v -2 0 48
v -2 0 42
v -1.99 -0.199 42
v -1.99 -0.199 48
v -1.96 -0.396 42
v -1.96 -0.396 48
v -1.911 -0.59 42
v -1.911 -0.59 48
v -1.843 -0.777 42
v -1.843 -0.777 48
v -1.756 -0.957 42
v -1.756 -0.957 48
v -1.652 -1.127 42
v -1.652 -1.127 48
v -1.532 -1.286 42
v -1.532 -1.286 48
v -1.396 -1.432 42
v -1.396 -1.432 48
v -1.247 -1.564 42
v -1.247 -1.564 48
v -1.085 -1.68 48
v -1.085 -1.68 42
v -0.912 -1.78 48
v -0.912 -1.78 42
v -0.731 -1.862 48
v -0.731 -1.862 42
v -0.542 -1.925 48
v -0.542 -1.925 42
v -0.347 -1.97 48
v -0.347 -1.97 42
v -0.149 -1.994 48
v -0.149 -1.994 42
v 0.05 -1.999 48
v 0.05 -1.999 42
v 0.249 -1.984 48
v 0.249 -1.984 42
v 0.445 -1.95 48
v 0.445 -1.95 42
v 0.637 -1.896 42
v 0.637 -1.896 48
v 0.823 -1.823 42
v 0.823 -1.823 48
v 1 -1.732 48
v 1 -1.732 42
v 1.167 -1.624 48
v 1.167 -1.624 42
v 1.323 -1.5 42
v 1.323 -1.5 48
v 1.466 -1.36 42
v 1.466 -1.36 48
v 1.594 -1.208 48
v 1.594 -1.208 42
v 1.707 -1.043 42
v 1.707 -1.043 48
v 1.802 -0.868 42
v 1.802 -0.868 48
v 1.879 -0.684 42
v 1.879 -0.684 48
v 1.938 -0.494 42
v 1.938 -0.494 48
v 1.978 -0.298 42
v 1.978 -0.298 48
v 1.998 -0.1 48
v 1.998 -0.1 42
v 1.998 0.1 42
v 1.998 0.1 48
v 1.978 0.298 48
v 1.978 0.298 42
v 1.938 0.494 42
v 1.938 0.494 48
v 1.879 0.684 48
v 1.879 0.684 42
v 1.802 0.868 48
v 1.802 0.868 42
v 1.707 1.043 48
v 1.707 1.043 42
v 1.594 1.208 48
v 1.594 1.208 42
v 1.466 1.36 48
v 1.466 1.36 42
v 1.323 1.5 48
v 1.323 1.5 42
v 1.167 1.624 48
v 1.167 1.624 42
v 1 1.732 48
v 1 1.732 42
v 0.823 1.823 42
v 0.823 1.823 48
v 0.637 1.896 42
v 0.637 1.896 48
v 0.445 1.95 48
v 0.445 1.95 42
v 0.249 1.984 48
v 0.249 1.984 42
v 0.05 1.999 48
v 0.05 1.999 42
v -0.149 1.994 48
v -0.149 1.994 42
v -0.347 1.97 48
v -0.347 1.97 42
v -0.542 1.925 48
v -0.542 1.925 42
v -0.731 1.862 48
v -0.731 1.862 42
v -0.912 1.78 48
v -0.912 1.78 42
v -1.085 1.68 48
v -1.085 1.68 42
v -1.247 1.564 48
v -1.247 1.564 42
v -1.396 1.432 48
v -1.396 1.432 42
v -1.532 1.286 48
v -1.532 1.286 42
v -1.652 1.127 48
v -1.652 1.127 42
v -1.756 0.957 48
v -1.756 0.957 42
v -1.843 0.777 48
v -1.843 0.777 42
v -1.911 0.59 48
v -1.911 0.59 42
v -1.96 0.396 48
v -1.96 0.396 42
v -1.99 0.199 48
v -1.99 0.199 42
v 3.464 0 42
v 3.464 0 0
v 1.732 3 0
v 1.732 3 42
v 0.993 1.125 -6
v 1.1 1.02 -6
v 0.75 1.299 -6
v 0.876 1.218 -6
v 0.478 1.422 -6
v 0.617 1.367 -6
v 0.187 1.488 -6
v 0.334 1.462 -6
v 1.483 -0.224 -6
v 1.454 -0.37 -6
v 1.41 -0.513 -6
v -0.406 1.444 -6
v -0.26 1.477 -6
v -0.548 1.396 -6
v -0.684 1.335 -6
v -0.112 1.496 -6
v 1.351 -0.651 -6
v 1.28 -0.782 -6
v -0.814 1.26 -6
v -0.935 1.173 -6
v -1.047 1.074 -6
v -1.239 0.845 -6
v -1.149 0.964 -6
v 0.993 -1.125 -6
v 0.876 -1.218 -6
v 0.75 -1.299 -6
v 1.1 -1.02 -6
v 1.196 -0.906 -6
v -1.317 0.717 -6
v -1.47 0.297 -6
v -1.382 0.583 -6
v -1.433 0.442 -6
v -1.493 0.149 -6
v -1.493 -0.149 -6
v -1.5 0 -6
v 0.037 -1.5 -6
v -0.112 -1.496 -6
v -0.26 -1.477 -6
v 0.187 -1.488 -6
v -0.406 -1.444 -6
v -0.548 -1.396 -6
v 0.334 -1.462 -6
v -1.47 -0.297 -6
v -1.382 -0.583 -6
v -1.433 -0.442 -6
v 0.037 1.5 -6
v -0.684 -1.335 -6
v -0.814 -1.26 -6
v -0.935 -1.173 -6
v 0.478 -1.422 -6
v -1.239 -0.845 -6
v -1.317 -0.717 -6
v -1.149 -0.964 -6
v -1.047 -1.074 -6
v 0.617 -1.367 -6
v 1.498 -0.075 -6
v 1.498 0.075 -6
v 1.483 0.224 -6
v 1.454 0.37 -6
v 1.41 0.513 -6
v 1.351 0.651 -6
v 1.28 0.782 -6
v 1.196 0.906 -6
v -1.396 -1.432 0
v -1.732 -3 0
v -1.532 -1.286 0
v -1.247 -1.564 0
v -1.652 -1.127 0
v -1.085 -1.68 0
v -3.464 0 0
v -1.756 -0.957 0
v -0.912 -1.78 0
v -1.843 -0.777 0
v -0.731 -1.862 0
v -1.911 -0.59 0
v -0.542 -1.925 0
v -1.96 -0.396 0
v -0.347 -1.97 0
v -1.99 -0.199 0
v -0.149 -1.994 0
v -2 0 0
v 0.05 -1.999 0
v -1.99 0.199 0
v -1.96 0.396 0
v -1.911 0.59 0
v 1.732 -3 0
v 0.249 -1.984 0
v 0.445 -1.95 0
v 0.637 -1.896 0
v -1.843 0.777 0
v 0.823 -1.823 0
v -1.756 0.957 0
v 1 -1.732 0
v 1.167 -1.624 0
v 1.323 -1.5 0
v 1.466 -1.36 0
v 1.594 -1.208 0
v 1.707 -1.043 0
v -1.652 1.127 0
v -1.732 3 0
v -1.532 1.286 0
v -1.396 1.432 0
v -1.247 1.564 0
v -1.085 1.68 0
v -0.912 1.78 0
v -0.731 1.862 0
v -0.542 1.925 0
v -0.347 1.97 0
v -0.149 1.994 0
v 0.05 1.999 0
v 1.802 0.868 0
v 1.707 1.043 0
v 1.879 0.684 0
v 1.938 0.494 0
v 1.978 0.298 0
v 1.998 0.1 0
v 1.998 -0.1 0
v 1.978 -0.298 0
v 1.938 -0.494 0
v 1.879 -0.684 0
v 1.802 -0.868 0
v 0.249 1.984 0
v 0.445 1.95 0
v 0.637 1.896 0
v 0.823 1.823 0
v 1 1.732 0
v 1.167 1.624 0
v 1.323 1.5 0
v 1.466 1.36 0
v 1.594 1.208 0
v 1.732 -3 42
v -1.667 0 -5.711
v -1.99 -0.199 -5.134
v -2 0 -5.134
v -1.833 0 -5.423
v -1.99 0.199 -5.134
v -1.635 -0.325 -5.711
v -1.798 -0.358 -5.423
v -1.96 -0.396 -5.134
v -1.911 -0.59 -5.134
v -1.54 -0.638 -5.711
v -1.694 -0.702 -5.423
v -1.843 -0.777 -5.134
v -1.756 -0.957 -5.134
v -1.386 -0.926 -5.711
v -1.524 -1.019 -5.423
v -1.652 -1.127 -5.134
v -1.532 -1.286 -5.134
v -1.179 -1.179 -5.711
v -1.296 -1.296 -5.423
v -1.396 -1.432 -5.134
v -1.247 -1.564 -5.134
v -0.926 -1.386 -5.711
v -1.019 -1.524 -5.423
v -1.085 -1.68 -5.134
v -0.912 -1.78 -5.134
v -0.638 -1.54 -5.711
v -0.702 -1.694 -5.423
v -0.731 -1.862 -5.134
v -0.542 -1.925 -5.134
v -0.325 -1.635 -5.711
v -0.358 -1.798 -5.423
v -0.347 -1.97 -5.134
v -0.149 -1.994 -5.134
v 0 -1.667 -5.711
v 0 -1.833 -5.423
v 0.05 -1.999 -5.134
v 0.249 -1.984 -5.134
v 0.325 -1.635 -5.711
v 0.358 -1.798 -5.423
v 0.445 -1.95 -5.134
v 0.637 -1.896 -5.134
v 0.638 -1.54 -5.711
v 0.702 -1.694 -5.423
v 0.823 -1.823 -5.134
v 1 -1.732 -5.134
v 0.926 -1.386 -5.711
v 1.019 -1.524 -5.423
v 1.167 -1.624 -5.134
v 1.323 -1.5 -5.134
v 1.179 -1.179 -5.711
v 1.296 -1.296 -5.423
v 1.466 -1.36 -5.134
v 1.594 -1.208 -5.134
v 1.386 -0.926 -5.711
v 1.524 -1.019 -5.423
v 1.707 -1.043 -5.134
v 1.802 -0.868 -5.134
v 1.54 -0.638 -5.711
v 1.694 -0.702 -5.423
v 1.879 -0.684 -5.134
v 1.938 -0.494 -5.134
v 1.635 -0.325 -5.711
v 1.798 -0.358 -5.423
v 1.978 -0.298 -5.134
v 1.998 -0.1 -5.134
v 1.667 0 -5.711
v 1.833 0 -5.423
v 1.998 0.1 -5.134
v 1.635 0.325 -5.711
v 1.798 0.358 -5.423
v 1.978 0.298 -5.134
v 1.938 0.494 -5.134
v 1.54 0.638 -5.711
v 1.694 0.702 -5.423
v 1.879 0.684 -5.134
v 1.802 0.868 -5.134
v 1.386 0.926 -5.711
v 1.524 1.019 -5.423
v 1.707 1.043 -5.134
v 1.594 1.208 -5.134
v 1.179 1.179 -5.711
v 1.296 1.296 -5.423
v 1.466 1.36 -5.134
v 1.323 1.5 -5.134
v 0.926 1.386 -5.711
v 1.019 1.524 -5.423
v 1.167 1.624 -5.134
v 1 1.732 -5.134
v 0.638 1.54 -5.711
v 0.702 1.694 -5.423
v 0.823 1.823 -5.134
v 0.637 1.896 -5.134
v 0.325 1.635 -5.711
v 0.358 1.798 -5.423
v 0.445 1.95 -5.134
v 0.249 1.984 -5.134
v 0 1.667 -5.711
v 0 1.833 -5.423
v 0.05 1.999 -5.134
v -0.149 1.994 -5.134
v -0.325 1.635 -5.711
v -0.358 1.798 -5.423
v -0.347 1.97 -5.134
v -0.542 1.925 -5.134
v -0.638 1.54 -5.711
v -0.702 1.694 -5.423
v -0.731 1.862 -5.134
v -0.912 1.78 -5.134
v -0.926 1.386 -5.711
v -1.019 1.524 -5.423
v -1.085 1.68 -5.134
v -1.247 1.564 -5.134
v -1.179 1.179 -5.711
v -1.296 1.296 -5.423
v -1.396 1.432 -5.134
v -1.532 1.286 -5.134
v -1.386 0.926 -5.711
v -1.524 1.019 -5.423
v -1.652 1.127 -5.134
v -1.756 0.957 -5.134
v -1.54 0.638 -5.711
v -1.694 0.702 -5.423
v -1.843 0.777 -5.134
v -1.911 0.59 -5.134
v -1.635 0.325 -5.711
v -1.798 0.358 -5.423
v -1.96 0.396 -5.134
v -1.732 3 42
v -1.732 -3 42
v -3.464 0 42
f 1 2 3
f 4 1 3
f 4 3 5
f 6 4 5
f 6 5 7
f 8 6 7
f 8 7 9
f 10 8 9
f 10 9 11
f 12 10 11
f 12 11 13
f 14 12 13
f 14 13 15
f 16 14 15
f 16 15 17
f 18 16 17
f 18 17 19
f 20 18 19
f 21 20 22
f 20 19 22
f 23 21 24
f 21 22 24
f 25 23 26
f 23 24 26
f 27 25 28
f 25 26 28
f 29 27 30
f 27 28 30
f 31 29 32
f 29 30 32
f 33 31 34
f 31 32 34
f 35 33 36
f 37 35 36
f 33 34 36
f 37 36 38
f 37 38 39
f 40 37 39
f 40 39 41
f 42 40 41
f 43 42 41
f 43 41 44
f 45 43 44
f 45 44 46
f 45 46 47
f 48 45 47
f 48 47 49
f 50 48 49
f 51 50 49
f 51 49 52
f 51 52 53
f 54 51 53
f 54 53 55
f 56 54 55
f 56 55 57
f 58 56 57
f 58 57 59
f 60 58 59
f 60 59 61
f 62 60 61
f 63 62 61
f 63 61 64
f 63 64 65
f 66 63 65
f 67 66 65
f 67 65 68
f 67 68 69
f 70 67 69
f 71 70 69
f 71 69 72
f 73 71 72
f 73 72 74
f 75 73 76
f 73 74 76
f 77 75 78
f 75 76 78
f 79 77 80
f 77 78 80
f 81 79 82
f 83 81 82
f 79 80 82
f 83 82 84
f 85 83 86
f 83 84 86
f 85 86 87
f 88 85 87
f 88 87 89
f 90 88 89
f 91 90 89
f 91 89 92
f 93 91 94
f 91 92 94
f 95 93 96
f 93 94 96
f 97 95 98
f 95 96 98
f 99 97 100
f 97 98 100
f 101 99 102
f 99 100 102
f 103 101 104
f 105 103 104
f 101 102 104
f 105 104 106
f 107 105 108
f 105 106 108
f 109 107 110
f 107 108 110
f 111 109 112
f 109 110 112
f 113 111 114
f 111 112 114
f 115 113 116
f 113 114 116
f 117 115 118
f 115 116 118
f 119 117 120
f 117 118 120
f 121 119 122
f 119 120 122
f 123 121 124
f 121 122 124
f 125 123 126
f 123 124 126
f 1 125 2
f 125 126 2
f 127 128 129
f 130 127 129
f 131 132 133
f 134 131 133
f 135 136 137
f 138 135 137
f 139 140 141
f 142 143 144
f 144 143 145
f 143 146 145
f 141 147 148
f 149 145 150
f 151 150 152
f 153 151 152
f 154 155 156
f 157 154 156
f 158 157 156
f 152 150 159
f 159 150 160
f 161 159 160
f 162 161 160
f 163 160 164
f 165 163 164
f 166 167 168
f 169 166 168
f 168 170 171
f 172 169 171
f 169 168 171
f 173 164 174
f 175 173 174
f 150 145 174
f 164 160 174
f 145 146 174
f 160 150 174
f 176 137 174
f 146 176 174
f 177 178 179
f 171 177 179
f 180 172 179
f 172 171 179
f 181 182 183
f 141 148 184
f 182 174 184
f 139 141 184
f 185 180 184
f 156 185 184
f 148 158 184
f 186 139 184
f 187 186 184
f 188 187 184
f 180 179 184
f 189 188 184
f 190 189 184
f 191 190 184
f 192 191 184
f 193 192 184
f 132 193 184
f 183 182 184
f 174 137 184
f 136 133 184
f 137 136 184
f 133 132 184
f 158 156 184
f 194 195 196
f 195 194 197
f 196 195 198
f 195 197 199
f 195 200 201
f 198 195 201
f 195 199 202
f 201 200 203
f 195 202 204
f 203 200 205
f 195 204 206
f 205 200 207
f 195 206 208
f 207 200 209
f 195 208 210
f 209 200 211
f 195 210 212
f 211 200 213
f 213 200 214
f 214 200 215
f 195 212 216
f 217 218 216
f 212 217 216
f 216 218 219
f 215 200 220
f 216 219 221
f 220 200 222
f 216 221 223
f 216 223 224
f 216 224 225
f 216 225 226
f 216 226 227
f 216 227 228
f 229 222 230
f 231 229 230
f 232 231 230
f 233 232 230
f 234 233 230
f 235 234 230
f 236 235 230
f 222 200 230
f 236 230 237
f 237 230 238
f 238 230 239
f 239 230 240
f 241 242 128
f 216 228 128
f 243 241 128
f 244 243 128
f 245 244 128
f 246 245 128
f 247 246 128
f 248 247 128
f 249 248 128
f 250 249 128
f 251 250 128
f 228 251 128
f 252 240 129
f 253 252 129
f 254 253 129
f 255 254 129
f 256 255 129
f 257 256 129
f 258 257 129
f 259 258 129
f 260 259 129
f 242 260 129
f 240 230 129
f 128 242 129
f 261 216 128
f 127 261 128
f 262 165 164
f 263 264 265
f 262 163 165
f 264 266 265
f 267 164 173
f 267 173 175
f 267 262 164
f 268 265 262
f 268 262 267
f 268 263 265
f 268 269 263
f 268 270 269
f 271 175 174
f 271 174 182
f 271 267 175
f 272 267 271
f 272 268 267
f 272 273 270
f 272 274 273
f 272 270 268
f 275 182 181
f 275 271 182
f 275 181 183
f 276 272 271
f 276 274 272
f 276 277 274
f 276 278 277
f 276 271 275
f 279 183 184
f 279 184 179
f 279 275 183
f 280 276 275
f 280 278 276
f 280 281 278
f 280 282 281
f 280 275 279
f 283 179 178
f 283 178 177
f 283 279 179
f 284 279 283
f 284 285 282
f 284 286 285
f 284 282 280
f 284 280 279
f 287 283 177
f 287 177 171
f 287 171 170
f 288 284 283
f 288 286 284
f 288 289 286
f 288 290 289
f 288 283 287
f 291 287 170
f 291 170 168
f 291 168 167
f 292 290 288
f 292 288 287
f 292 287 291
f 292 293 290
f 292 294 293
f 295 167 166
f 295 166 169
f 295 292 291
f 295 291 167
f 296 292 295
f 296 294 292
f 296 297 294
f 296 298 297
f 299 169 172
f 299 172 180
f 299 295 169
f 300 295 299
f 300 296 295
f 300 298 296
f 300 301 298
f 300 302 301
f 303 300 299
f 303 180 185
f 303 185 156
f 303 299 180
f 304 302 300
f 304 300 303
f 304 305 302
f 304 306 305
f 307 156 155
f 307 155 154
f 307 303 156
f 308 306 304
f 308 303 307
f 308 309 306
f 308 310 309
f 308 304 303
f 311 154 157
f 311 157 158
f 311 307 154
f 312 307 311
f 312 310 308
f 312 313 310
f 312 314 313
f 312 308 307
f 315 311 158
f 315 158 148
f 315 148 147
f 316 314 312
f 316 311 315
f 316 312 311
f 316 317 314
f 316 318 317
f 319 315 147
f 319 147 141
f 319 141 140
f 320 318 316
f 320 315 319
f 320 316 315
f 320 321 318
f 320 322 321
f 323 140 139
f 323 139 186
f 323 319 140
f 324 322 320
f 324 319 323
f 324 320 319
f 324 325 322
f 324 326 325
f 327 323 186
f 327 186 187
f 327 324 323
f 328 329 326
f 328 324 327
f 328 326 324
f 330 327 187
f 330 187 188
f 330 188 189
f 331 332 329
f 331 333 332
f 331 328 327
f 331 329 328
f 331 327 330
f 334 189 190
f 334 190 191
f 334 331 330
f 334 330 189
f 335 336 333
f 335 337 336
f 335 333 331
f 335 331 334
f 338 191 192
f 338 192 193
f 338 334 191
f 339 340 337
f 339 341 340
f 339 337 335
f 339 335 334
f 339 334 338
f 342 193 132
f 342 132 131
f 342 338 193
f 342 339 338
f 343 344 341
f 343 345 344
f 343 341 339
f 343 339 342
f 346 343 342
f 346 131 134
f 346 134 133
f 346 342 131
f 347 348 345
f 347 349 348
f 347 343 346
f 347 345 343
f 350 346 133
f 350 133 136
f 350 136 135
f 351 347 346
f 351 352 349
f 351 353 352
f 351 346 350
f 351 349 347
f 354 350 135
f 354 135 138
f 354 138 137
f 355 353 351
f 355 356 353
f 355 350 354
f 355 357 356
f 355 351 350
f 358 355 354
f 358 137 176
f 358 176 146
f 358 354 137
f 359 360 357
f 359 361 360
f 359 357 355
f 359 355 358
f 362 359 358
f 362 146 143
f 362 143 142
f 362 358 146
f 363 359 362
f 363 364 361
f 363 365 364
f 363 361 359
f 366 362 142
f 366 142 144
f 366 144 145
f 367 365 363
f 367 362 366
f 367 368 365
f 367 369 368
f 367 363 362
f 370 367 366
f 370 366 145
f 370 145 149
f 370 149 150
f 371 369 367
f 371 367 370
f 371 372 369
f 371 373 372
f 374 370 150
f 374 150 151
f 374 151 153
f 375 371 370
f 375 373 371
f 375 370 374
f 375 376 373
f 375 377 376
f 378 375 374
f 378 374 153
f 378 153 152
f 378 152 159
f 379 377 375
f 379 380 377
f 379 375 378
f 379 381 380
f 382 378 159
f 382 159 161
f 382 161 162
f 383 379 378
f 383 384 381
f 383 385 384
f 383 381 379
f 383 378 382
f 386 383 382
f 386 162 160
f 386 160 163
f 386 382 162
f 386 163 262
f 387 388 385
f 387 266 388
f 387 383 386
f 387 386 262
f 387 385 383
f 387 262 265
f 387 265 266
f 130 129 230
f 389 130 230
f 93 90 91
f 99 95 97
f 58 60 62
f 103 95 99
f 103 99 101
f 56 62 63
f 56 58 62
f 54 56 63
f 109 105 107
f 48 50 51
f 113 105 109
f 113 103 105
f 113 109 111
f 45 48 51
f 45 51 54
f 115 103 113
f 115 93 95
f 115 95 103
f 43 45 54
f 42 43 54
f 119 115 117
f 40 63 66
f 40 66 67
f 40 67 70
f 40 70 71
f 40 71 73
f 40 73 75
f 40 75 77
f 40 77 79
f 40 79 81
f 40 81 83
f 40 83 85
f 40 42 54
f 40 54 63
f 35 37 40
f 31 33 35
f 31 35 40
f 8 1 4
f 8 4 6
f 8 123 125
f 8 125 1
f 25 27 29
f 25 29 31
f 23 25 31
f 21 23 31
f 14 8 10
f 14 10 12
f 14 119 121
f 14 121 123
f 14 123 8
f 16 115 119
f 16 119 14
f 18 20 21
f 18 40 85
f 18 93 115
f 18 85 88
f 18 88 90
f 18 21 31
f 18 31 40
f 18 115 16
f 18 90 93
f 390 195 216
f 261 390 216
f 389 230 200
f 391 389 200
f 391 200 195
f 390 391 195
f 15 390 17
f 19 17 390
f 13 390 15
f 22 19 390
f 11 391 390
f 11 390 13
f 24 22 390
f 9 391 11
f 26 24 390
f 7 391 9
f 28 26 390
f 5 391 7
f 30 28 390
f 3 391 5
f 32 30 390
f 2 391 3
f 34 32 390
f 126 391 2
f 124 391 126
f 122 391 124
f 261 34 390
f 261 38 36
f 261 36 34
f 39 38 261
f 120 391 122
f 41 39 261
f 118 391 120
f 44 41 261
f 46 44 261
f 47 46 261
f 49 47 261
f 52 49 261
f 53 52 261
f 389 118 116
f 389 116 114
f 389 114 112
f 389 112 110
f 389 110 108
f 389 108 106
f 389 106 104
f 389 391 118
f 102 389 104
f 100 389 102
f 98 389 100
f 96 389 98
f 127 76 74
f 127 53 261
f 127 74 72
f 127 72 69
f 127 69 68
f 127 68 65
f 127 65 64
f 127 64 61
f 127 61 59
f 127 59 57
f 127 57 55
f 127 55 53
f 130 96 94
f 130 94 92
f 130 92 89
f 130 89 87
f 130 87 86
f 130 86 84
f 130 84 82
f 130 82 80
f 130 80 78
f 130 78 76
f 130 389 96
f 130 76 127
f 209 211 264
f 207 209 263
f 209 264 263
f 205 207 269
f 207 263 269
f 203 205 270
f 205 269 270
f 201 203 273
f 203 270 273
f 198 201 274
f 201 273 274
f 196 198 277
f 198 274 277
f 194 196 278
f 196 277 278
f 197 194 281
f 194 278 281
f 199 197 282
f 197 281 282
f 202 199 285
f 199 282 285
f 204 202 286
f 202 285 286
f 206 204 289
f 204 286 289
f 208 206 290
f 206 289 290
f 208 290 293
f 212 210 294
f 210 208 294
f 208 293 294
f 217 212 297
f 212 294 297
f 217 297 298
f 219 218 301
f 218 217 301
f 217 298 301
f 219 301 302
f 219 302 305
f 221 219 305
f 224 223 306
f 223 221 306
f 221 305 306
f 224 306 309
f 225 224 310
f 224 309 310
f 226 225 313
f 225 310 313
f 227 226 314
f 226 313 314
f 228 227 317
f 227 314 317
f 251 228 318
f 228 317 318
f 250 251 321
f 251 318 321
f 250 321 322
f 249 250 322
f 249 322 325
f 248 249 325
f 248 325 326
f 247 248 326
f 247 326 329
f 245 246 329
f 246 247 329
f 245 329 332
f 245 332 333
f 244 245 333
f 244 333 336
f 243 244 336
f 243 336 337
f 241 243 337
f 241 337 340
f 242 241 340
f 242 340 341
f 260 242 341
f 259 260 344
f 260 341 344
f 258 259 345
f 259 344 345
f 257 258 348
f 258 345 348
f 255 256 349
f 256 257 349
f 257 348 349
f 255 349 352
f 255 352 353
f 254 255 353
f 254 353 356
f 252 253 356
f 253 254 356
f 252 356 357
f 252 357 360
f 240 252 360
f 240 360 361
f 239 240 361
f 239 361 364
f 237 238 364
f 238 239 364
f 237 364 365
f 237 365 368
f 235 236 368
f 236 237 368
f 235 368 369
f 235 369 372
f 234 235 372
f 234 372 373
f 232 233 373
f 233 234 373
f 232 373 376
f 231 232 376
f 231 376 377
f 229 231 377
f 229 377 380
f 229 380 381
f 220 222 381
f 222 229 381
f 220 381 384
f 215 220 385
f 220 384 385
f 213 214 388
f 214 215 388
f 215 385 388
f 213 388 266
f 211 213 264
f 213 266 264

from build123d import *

# Parameters (mm, degrees)
EXTRUDE_1_DEPTH      = 42
EXTRUDE_2_DEPTH      = 6
EXTRUDE_2_DEPTH_BACK = 48
SKETCH_2_R           = 2
CHAMFER_1_SIZE       = 0.5
CHAMFER_1_SIZE2      = 0.866025404


with BuildPart() as part:
    # 草图1 → 拉伸1 (new body)
    with BuildSketch(Plane.XY):
        Polygon((1.732050808, -3), (3.464101615, 0), (1.732050808, 3), (-1.732050808, 3), (-3.464101615, 0), (-1.732050808, -3), align=None)
    extrude(amount=EXTRUDE_1_DEPTH)

    # 草图2 → 拉伸2 (add, two sides: drawn at the far end of the back side and taken through both)
    with BuildSketch(Plane.XY.offset(42).offset(-EXTRUDE_2_DEPTH_BACK)):
        with Locations(Location((0, 0, 0), (0, 0, 180))):
            Circle(SKETCH_2_R)
    extrude(amount=EXTRUDE_2_DEPTH + EXTRUDE_2_DEPTH_BACK)

    # 倒角1
    chamfer_1_edges = [part.edges().sort_by_distance(p)[0] for p in [
        (2, 0, -6),
    ]]
    chamfer_1_side = [part.faces().sort_by_distance(p)[0] for p in [
        (0, 0, -6),
    ]]
    chamfer(chamfer_1_edges, length=CHAMFER_1_SIZE, length2=CHAMFER_1_SIZE2, reference=chamfer_1_side[0])


solid = part.part
